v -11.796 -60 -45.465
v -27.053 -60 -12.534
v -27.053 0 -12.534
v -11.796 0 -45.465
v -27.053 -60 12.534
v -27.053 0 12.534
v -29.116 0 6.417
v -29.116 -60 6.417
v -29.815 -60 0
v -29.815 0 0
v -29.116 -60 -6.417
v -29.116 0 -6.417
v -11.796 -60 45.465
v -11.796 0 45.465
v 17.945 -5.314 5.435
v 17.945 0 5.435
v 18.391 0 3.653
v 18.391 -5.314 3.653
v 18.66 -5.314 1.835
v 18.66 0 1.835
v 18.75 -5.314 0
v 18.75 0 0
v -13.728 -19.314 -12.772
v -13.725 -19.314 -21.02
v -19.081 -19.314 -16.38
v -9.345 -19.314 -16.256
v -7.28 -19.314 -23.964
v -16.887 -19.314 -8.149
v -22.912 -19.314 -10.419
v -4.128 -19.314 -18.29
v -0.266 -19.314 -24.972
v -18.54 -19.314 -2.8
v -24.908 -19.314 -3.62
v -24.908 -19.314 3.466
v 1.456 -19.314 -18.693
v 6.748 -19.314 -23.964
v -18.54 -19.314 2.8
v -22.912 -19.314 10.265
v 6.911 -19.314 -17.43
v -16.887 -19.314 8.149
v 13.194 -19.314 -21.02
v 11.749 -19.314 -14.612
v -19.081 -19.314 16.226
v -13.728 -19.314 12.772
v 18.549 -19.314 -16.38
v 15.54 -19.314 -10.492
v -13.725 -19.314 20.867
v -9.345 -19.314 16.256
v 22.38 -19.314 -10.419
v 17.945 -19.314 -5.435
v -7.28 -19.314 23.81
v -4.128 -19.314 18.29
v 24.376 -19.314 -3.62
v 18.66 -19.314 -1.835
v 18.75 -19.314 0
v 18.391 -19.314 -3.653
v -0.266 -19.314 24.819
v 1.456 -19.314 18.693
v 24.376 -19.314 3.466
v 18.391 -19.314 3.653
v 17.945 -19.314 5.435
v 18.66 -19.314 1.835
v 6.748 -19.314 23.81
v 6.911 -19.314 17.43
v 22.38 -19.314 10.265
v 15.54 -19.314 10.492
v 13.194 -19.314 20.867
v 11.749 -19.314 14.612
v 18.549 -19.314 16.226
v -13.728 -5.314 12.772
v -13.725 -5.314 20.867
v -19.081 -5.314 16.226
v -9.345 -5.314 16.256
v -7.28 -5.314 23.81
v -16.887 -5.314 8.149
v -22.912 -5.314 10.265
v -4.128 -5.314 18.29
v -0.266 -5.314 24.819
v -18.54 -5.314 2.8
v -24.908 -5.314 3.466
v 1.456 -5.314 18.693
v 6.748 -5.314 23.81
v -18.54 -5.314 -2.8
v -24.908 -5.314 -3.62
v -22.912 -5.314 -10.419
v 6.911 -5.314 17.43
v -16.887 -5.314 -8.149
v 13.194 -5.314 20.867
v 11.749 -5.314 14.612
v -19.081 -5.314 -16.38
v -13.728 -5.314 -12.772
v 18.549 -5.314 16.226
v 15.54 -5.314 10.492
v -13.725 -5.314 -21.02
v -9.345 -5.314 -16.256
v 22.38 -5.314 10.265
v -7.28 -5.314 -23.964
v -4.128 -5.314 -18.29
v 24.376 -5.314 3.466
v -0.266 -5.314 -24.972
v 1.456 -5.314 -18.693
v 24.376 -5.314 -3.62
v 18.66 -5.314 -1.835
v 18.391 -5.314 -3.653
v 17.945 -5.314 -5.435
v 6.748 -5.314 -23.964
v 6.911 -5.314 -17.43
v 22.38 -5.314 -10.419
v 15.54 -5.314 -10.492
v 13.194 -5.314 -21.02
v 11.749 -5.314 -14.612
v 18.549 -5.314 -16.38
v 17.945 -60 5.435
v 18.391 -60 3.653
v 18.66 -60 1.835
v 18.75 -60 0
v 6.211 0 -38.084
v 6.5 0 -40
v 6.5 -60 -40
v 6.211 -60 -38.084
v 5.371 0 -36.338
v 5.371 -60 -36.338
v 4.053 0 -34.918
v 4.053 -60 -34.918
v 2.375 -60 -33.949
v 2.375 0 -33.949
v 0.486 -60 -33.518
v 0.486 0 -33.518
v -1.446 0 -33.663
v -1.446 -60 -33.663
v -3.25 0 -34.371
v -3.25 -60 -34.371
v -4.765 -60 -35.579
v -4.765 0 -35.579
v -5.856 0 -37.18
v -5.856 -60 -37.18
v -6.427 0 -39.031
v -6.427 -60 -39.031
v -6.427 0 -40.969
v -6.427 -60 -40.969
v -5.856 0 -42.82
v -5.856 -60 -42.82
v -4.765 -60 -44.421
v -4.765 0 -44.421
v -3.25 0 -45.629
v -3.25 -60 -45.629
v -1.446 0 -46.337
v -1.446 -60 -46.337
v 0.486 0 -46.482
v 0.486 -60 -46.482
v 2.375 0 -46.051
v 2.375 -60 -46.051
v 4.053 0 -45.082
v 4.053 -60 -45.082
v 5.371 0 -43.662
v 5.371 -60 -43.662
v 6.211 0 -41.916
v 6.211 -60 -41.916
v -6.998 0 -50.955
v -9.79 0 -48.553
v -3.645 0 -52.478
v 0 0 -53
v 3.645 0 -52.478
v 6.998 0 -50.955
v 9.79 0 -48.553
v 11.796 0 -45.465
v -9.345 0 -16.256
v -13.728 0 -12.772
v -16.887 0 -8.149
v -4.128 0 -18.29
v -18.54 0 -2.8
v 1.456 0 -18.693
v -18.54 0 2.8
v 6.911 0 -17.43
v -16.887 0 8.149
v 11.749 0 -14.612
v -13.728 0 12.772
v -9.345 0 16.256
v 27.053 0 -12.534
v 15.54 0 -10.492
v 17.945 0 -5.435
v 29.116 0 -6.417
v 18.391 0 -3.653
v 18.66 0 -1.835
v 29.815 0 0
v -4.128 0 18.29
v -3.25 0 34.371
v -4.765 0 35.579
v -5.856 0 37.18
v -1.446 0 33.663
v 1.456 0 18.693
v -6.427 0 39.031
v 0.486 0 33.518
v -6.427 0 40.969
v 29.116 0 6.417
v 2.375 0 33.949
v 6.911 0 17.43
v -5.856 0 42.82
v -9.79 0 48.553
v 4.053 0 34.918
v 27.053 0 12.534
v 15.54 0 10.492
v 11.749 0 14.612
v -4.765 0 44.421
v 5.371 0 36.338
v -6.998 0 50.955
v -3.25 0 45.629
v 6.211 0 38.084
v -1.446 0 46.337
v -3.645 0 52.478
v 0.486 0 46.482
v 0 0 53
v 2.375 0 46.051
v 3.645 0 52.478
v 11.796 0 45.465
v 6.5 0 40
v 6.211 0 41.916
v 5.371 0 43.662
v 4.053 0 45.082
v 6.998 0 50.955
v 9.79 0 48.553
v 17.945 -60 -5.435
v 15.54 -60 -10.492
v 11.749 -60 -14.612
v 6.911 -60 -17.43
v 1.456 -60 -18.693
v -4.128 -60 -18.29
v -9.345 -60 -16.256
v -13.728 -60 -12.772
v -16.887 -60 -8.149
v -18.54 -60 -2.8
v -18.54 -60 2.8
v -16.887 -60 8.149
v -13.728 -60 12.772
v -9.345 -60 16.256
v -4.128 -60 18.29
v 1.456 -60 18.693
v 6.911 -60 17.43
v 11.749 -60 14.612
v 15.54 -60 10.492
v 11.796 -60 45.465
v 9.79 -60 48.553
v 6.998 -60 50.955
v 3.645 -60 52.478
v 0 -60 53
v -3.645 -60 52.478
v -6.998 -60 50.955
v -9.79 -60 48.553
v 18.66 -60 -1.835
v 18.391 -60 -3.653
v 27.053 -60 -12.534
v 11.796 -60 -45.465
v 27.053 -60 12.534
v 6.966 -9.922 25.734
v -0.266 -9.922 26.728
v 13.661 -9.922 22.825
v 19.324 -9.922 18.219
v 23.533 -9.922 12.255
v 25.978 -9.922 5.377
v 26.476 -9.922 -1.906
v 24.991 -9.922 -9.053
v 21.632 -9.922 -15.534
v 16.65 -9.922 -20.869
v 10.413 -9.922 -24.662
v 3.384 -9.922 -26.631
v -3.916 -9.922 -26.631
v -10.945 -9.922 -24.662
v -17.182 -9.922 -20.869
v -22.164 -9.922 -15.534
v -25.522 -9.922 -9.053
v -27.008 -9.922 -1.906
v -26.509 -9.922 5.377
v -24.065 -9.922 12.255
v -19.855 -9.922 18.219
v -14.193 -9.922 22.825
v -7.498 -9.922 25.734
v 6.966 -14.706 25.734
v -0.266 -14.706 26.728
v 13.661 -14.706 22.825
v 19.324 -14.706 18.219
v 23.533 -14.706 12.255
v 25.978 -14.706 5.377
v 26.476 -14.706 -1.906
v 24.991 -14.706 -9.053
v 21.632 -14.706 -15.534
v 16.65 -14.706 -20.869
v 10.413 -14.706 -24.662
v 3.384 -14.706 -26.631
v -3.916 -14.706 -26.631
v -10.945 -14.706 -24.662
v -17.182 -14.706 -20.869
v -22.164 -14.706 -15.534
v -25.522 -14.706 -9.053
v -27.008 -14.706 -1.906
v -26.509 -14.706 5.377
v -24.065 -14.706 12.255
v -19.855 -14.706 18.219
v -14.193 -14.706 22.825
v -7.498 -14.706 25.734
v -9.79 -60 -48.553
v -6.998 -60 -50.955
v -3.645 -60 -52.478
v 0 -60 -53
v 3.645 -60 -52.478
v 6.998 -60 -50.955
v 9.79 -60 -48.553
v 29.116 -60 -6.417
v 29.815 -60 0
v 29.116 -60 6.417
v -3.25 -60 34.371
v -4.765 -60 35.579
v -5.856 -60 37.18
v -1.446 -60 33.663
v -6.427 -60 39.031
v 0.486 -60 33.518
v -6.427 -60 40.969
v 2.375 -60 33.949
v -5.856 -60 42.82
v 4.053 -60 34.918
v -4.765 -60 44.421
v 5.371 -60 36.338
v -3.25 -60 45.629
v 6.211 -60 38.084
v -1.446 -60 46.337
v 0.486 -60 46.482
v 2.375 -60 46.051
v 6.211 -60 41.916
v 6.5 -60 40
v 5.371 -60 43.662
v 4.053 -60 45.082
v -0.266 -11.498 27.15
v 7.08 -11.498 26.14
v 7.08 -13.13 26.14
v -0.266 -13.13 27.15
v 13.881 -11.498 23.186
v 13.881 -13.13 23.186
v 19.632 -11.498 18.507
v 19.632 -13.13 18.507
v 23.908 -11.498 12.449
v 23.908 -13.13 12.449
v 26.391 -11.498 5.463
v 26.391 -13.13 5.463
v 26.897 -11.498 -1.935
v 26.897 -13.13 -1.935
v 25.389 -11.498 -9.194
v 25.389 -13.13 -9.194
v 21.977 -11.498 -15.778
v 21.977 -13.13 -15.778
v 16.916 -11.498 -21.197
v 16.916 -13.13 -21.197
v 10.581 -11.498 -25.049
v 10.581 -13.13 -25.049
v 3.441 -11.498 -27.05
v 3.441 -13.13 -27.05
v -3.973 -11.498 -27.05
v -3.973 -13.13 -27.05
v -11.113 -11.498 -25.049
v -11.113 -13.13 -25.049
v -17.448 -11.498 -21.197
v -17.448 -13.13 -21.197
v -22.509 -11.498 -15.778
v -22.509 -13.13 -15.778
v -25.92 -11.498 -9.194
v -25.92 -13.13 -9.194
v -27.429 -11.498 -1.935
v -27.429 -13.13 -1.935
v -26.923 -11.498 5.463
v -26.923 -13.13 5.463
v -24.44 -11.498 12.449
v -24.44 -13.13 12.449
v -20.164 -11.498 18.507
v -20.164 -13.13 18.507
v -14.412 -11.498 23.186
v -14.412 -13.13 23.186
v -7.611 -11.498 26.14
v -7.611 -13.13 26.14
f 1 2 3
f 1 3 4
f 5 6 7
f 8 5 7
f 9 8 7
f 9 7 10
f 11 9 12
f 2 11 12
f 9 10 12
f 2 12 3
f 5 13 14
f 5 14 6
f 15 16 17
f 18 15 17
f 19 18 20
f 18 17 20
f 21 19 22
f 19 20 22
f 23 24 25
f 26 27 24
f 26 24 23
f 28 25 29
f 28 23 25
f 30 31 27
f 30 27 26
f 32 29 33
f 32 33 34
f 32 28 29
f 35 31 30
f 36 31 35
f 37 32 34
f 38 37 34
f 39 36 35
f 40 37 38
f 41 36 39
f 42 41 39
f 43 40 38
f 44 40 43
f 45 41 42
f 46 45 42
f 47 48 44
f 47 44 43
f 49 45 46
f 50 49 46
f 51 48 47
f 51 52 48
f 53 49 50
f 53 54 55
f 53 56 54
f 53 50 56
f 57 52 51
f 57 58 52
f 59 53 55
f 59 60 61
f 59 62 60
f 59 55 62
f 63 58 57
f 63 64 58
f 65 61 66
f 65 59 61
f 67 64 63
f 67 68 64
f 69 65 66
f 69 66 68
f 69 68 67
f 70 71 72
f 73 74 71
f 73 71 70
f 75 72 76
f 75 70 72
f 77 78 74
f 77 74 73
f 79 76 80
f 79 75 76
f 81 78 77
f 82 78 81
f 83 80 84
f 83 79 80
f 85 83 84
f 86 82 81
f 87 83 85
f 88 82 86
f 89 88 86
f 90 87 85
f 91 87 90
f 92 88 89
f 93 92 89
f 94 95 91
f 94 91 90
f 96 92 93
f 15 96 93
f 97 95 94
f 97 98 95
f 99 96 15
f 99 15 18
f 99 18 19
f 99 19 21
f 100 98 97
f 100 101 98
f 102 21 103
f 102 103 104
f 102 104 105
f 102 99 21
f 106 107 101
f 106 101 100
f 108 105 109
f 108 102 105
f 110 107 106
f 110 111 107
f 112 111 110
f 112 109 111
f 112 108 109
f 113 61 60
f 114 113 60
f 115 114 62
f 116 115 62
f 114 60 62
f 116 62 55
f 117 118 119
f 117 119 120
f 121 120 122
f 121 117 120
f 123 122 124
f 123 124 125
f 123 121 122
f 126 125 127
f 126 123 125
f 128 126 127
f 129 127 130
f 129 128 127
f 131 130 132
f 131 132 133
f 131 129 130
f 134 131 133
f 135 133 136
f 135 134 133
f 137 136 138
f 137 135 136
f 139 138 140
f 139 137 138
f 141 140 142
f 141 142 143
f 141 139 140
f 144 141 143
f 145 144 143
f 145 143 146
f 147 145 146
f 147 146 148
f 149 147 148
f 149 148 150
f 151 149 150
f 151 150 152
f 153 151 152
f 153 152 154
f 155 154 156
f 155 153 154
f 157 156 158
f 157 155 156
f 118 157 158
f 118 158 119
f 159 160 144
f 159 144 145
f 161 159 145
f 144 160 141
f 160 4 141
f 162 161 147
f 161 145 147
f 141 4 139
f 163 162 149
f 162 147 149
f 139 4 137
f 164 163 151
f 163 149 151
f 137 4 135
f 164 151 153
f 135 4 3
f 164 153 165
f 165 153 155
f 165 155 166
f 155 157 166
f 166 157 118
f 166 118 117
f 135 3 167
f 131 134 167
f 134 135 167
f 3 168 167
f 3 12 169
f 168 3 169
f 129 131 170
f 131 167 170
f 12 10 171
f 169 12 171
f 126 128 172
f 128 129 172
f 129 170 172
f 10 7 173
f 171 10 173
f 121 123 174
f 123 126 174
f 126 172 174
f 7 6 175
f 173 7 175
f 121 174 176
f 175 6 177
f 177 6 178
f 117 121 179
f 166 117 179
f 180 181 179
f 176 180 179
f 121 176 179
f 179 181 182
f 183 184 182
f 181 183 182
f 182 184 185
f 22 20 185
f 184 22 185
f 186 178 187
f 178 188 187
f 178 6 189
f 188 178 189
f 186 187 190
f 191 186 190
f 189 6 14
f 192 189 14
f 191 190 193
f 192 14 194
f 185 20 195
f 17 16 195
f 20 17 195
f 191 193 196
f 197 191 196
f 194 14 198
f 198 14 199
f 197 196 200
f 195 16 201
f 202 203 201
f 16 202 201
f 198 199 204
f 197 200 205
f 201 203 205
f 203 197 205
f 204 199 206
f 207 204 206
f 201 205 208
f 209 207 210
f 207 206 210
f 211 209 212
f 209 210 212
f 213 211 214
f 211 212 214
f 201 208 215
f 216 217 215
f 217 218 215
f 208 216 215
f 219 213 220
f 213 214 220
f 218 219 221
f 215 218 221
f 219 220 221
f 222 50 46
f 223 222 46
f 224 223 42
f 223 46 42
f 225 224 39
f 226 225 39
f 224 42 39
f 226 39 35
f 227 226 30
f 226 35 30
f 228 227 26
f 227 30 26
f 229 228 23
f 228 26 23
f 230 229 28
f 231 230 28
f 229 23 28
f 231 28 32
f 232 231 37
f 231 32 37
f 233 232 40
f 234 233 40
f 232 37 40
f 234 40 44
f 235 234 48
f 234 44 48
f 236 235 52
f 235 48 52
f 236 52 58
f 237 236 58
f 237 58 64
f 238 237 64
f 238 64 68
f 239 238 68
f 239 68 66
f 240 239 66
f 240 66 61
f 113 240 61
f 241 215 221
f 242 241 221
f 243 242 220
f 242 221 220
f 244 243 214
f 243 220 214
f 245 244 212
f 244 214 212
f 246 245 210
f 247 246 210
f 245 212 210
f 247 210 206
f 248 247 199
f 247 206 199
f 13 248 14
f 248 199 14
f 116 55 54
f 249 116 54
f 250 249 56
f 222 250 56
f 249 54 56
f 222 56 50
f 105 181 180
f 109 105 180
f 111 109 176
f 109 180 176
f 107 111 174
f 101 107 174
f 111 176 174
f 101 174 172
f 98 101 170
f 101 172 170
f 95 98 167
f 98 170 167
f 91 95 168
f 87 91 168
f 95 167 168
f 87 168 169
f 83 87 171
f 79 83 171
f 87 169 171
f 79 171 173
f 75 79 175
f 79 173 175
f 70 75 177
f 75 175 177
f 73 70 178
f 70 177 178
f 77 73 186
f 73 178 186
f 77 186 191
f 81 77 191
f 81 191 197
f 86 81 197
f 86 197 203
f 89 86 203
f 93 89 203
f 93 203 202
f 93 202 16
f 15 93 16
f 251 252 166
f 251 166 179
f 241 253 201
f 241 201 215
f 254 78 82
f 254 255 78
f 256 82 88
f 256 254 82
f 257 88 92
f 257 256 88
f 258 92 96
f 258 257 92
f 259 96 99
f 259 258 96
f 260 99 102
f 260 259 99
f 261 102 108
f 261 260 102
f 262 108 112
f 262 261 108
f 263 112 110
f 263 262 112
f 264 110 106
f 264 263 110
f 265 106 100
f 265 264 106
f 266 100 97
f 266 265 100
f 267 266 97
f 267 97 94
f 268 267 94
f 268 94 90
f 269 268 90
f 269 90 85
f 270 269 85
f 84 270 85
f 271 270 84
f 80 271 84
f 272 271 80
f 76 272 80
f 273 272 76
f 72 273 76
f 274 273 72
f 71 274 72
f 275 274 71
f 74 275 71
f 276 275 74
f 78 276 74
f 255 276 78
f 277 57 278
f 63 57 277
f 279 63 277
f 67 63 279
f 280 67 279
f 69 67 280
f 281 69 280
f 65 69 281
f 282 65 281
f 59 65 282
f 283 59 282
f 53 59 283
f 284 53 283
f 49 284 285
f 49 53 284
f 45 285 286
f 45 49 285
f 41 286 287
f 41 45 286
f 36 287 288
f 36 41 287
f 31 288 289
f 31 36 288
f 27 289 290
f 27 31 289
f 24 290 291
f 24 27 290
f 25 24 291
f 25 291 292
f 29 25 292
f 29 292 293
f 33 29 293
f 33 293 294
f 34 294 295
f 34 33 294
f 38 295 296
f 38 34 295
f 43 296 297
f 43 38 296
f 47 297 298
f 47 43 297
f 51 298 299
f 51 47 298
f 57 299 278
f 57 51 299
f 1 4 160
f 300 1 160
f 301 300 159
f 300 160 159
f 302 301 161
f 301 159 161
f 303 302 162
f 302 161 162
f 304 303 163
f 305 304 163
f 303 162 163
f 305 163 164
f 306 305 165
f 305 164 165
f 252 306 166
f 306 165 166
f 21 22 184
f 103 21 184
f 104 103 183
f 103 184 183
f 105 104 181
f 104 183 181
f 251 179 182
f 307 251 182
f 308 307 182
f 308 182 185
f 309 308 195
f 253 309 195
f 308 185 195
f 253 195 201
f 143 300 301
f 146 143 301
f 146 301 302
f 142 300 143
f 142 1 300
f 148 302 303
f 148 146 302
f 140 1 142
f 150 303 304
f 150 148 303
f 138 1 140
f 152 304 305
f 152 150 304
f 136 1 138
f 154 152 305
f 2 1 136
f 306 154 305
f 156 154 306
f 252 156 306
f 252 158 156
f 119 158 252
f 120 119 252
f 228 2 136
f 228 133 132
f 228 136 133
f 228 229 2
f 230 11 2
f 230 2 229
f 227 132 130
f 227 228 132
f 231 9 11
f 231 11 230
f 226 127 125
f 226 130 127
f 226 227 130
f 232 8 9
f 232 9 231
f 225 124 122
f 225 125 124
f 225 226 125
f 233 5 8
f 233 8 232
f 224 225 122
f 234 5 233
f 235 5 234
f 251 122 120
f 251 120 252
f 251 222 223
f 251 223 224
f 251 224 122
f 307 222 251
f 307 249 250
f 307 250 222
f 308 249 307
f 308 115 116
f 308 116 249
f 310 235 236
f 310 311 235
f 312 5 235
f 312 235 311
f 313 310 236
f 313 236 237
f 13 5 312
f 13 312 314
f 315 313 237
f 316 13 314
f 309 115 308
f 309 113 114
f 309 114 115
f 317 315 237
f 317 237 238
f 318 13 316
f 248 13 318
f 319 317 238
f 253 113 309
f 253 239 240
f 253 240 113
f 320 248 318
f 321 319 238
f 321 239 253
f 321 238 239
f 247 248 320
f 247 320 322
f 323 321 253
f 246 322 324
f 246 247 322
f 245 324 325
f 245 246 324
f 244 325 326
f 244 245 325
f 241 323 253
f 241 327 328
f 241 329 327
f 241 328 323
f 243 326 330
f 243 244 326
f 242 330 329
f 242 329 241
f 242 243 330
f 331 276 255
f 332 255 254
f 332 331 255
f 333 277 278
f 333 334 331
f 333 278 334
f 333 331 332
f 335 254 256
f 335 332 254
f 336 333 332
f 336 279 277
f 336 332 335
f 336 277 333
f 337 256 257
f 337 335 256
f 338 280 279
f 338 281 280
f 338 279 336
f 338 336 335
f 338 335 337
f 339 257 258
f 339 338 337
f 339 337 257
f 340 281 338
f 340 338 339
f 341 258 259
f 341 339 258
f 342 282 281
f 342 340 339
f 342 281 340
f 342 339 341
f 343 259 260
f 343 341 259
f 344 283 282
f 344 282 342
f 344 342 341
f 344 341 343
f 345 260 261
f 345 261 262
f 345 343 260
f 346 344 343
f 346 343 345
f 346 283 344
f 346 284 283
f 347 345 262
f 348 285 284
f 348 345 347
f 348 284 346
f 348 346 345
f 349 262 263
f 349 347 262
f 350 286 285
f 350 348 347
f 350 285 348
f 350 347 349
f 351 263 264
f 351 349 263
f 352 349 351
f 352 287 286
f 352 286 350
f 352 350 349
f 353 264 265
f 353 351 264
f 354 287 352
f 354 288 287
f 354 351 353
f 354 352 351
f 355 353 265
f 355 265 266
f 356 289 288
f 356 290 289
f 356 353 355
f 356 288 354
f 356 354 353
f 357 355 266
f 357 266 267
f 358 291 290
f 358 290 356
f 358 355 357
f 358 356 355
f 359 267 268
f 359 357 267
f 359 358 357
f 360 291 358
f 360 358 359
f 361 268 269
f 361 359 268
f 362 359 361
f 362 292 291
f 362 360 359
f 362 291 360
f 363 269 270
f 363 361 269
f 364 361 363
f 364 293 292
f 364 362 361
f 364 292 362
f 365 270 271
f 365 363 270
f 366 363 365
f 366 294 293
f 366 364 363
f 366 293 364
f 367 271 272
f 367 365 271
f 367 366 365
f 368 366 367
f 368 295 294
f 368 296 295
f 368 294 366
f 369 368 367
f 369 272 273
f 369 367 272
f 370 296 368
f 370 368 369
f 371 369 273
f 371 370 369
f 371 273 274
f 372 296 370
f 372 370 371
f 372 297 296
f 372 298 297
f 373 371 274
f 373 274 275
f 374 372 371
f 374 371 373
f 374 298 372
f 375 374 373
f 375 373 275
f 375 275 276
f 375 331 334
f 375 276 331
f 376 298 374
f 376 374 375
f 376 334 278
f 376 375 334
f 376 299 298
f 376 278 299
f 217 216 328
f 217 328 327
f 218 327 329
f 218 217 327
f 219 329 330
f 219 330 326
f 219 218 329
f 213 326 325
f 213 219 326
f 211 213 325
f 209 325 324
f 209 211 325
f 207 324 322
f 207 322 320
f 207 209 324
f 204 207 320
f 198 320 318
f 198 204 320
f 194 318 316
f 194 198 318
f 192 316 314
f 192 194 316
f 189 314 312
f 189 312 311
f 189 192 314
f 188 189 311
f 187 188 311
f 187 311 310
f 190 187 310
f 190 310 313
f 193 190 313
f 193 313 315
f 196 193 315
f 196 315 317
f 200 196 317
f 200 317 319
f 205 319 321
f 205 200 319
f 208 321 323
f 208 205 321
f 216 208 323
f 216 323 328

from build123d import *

# Parameters (mm, degrees)
F0_R     = 6.5
F1_DEPTH = 60
F3_ANGLE = 90


# Not quite as in the source:
# - a feature names something its author has since deleted; it is built from what else it names


with BuildPart() as f1:
    # F0 (on Front) → F1 (new body)
    with BuildSketch(Plane.XZ):
        with BuildLine():
            Line((-11.7955299893, 45.4649311314), (-27.0527510662, 12.5336819647))
            ThreePointArc((-27.0527510662, 12.5336819647), (-29.8151727119, 0), (-27.0527510662, -12.5336819647))
            Line((-27.0527510662, -12.5336819647), (-11.7955299893, -45.4649311314))
            ThreePointArc((-11.7955299893, -45.4649311314), (0, -53), (11.7955299893, -45.4649311314))
            Line((11.7955299893, -45.4649311314), (27.0527510662, -12.5336819647))
            ThreePointArc((27.0527510662, -12.5336819647), (29.8151727119, 0), (27.0527510662, 12.5336819647))
            Line((27.0527510662, 12.5336819647), (11.7955299893, 45.4649311314))
            ThreePointArc((11.7955299893, 45.4649311314), (0, 53), (-11.7955299893, 45.4649311314))
        make_face()
        with Locations((0, -40)):
            Circle(F0_R, mode=Mode.SUBTRACT)
        with BuildLine():
            ThreePointArc((17.9448621018, -5.4354782815), (-18.75, 0), (17.9448621018, 5.4354782815))
            ThreePointArc((17.9448621018, 5.4354782815), (24.1748678936, 5.401139318), (27.28, 0))
            ThreePointArc((27.28, 0), (24.1748678936, -5.401139318), (17.9448621018, -5.4354782815))
        make_face(mode=Mode.SUBTRACT)
        with Locations((0, 40)):
            Circle(F0_R, mode=Mode.SUBTRACT)
        with BuildLine():
            ThreePointArc((17.9448621018, 5.4354782815), (18.5476233573, 2.7473929089), (18.75, 0))
            ThreePointArc((18.75, 0), (18.5476233573, -2.7473929089), (17.9448621018, -5.4354782815))
            ThreePointArc((17.9448621018, -5.4354782815), (24.1748678936, -5.401139318), (27.28, 0))
            ThreePointArc((27.28, 0), (24.1748678936, 5.401139318), (17.9448621018, 5.4354782815))
        make_face()
    extrude(amount=F1_DEPTH)


with BuildPart() as f2:
    # F0 (on Front) → F2 (revolve)
    with BuildSketch(Plane.XZ):
        with BuildLine():
            ThreePointArc((78.6849431597, 21.03), (68.9626292834, 15.8333148696), (70.0431715295, 26.8042470045))
            Line((70.0431715295, 26.8042470045), (65.4349431597, 24.8954563152))
            Line((65.4349431597, 24.8954563152), (65.4349431597, 0))
            Line((65.4349431597, 0), (79.4349431597, 0))
            Line((79.4349431597, 0), (79.4349431597, 24.8954563152))
            Line((79.4349431597, 24.8954563152), (74.8267146878, 26.8042470468))
            ThreePointArc((74.8267146878, 26.8042470468), (77.6316282594, 24.5023139222), (78.6849431597, 21.03))
        make_face()
        with BuildLine():
            ThreePointArc((74.8267146878, 26.8042470468), (72.4349431044, 27.28), (70.0431715295, 26.8042470045))
            ThreePointArc((70.0431715295, 26.8042470045), (68.9626292834, 15.8333148696), (78.6849431597, 21.03))
            ThreePointArc((78.6849431597, 21.03), (77.6316282594, 24.5023139222), (74.8267146878, 26.8042470468))
        make_face()
    revolve(axis=Axis((72.4349431597, 0, 0), (1, 0, 0)))


with BuildPart() as f2_1:
    # F3: moved
    add(f2.part.rotate(Axis((72.4349431597, 0, 17.3734594136), (0, 0, 1)), F3_ANGLE))


with BuildPart() as f2_2:
    # F4: moved
    add(f2_1.part.moved(Location((-72.7008, -12.31385, -0.07673))))


with BuildPart() as f1_1:
    add(f1.part)

    # F5: cut F2
    add(f2_2.part, mode=Mode.SUBTRACT)


solid = f1_1.part
